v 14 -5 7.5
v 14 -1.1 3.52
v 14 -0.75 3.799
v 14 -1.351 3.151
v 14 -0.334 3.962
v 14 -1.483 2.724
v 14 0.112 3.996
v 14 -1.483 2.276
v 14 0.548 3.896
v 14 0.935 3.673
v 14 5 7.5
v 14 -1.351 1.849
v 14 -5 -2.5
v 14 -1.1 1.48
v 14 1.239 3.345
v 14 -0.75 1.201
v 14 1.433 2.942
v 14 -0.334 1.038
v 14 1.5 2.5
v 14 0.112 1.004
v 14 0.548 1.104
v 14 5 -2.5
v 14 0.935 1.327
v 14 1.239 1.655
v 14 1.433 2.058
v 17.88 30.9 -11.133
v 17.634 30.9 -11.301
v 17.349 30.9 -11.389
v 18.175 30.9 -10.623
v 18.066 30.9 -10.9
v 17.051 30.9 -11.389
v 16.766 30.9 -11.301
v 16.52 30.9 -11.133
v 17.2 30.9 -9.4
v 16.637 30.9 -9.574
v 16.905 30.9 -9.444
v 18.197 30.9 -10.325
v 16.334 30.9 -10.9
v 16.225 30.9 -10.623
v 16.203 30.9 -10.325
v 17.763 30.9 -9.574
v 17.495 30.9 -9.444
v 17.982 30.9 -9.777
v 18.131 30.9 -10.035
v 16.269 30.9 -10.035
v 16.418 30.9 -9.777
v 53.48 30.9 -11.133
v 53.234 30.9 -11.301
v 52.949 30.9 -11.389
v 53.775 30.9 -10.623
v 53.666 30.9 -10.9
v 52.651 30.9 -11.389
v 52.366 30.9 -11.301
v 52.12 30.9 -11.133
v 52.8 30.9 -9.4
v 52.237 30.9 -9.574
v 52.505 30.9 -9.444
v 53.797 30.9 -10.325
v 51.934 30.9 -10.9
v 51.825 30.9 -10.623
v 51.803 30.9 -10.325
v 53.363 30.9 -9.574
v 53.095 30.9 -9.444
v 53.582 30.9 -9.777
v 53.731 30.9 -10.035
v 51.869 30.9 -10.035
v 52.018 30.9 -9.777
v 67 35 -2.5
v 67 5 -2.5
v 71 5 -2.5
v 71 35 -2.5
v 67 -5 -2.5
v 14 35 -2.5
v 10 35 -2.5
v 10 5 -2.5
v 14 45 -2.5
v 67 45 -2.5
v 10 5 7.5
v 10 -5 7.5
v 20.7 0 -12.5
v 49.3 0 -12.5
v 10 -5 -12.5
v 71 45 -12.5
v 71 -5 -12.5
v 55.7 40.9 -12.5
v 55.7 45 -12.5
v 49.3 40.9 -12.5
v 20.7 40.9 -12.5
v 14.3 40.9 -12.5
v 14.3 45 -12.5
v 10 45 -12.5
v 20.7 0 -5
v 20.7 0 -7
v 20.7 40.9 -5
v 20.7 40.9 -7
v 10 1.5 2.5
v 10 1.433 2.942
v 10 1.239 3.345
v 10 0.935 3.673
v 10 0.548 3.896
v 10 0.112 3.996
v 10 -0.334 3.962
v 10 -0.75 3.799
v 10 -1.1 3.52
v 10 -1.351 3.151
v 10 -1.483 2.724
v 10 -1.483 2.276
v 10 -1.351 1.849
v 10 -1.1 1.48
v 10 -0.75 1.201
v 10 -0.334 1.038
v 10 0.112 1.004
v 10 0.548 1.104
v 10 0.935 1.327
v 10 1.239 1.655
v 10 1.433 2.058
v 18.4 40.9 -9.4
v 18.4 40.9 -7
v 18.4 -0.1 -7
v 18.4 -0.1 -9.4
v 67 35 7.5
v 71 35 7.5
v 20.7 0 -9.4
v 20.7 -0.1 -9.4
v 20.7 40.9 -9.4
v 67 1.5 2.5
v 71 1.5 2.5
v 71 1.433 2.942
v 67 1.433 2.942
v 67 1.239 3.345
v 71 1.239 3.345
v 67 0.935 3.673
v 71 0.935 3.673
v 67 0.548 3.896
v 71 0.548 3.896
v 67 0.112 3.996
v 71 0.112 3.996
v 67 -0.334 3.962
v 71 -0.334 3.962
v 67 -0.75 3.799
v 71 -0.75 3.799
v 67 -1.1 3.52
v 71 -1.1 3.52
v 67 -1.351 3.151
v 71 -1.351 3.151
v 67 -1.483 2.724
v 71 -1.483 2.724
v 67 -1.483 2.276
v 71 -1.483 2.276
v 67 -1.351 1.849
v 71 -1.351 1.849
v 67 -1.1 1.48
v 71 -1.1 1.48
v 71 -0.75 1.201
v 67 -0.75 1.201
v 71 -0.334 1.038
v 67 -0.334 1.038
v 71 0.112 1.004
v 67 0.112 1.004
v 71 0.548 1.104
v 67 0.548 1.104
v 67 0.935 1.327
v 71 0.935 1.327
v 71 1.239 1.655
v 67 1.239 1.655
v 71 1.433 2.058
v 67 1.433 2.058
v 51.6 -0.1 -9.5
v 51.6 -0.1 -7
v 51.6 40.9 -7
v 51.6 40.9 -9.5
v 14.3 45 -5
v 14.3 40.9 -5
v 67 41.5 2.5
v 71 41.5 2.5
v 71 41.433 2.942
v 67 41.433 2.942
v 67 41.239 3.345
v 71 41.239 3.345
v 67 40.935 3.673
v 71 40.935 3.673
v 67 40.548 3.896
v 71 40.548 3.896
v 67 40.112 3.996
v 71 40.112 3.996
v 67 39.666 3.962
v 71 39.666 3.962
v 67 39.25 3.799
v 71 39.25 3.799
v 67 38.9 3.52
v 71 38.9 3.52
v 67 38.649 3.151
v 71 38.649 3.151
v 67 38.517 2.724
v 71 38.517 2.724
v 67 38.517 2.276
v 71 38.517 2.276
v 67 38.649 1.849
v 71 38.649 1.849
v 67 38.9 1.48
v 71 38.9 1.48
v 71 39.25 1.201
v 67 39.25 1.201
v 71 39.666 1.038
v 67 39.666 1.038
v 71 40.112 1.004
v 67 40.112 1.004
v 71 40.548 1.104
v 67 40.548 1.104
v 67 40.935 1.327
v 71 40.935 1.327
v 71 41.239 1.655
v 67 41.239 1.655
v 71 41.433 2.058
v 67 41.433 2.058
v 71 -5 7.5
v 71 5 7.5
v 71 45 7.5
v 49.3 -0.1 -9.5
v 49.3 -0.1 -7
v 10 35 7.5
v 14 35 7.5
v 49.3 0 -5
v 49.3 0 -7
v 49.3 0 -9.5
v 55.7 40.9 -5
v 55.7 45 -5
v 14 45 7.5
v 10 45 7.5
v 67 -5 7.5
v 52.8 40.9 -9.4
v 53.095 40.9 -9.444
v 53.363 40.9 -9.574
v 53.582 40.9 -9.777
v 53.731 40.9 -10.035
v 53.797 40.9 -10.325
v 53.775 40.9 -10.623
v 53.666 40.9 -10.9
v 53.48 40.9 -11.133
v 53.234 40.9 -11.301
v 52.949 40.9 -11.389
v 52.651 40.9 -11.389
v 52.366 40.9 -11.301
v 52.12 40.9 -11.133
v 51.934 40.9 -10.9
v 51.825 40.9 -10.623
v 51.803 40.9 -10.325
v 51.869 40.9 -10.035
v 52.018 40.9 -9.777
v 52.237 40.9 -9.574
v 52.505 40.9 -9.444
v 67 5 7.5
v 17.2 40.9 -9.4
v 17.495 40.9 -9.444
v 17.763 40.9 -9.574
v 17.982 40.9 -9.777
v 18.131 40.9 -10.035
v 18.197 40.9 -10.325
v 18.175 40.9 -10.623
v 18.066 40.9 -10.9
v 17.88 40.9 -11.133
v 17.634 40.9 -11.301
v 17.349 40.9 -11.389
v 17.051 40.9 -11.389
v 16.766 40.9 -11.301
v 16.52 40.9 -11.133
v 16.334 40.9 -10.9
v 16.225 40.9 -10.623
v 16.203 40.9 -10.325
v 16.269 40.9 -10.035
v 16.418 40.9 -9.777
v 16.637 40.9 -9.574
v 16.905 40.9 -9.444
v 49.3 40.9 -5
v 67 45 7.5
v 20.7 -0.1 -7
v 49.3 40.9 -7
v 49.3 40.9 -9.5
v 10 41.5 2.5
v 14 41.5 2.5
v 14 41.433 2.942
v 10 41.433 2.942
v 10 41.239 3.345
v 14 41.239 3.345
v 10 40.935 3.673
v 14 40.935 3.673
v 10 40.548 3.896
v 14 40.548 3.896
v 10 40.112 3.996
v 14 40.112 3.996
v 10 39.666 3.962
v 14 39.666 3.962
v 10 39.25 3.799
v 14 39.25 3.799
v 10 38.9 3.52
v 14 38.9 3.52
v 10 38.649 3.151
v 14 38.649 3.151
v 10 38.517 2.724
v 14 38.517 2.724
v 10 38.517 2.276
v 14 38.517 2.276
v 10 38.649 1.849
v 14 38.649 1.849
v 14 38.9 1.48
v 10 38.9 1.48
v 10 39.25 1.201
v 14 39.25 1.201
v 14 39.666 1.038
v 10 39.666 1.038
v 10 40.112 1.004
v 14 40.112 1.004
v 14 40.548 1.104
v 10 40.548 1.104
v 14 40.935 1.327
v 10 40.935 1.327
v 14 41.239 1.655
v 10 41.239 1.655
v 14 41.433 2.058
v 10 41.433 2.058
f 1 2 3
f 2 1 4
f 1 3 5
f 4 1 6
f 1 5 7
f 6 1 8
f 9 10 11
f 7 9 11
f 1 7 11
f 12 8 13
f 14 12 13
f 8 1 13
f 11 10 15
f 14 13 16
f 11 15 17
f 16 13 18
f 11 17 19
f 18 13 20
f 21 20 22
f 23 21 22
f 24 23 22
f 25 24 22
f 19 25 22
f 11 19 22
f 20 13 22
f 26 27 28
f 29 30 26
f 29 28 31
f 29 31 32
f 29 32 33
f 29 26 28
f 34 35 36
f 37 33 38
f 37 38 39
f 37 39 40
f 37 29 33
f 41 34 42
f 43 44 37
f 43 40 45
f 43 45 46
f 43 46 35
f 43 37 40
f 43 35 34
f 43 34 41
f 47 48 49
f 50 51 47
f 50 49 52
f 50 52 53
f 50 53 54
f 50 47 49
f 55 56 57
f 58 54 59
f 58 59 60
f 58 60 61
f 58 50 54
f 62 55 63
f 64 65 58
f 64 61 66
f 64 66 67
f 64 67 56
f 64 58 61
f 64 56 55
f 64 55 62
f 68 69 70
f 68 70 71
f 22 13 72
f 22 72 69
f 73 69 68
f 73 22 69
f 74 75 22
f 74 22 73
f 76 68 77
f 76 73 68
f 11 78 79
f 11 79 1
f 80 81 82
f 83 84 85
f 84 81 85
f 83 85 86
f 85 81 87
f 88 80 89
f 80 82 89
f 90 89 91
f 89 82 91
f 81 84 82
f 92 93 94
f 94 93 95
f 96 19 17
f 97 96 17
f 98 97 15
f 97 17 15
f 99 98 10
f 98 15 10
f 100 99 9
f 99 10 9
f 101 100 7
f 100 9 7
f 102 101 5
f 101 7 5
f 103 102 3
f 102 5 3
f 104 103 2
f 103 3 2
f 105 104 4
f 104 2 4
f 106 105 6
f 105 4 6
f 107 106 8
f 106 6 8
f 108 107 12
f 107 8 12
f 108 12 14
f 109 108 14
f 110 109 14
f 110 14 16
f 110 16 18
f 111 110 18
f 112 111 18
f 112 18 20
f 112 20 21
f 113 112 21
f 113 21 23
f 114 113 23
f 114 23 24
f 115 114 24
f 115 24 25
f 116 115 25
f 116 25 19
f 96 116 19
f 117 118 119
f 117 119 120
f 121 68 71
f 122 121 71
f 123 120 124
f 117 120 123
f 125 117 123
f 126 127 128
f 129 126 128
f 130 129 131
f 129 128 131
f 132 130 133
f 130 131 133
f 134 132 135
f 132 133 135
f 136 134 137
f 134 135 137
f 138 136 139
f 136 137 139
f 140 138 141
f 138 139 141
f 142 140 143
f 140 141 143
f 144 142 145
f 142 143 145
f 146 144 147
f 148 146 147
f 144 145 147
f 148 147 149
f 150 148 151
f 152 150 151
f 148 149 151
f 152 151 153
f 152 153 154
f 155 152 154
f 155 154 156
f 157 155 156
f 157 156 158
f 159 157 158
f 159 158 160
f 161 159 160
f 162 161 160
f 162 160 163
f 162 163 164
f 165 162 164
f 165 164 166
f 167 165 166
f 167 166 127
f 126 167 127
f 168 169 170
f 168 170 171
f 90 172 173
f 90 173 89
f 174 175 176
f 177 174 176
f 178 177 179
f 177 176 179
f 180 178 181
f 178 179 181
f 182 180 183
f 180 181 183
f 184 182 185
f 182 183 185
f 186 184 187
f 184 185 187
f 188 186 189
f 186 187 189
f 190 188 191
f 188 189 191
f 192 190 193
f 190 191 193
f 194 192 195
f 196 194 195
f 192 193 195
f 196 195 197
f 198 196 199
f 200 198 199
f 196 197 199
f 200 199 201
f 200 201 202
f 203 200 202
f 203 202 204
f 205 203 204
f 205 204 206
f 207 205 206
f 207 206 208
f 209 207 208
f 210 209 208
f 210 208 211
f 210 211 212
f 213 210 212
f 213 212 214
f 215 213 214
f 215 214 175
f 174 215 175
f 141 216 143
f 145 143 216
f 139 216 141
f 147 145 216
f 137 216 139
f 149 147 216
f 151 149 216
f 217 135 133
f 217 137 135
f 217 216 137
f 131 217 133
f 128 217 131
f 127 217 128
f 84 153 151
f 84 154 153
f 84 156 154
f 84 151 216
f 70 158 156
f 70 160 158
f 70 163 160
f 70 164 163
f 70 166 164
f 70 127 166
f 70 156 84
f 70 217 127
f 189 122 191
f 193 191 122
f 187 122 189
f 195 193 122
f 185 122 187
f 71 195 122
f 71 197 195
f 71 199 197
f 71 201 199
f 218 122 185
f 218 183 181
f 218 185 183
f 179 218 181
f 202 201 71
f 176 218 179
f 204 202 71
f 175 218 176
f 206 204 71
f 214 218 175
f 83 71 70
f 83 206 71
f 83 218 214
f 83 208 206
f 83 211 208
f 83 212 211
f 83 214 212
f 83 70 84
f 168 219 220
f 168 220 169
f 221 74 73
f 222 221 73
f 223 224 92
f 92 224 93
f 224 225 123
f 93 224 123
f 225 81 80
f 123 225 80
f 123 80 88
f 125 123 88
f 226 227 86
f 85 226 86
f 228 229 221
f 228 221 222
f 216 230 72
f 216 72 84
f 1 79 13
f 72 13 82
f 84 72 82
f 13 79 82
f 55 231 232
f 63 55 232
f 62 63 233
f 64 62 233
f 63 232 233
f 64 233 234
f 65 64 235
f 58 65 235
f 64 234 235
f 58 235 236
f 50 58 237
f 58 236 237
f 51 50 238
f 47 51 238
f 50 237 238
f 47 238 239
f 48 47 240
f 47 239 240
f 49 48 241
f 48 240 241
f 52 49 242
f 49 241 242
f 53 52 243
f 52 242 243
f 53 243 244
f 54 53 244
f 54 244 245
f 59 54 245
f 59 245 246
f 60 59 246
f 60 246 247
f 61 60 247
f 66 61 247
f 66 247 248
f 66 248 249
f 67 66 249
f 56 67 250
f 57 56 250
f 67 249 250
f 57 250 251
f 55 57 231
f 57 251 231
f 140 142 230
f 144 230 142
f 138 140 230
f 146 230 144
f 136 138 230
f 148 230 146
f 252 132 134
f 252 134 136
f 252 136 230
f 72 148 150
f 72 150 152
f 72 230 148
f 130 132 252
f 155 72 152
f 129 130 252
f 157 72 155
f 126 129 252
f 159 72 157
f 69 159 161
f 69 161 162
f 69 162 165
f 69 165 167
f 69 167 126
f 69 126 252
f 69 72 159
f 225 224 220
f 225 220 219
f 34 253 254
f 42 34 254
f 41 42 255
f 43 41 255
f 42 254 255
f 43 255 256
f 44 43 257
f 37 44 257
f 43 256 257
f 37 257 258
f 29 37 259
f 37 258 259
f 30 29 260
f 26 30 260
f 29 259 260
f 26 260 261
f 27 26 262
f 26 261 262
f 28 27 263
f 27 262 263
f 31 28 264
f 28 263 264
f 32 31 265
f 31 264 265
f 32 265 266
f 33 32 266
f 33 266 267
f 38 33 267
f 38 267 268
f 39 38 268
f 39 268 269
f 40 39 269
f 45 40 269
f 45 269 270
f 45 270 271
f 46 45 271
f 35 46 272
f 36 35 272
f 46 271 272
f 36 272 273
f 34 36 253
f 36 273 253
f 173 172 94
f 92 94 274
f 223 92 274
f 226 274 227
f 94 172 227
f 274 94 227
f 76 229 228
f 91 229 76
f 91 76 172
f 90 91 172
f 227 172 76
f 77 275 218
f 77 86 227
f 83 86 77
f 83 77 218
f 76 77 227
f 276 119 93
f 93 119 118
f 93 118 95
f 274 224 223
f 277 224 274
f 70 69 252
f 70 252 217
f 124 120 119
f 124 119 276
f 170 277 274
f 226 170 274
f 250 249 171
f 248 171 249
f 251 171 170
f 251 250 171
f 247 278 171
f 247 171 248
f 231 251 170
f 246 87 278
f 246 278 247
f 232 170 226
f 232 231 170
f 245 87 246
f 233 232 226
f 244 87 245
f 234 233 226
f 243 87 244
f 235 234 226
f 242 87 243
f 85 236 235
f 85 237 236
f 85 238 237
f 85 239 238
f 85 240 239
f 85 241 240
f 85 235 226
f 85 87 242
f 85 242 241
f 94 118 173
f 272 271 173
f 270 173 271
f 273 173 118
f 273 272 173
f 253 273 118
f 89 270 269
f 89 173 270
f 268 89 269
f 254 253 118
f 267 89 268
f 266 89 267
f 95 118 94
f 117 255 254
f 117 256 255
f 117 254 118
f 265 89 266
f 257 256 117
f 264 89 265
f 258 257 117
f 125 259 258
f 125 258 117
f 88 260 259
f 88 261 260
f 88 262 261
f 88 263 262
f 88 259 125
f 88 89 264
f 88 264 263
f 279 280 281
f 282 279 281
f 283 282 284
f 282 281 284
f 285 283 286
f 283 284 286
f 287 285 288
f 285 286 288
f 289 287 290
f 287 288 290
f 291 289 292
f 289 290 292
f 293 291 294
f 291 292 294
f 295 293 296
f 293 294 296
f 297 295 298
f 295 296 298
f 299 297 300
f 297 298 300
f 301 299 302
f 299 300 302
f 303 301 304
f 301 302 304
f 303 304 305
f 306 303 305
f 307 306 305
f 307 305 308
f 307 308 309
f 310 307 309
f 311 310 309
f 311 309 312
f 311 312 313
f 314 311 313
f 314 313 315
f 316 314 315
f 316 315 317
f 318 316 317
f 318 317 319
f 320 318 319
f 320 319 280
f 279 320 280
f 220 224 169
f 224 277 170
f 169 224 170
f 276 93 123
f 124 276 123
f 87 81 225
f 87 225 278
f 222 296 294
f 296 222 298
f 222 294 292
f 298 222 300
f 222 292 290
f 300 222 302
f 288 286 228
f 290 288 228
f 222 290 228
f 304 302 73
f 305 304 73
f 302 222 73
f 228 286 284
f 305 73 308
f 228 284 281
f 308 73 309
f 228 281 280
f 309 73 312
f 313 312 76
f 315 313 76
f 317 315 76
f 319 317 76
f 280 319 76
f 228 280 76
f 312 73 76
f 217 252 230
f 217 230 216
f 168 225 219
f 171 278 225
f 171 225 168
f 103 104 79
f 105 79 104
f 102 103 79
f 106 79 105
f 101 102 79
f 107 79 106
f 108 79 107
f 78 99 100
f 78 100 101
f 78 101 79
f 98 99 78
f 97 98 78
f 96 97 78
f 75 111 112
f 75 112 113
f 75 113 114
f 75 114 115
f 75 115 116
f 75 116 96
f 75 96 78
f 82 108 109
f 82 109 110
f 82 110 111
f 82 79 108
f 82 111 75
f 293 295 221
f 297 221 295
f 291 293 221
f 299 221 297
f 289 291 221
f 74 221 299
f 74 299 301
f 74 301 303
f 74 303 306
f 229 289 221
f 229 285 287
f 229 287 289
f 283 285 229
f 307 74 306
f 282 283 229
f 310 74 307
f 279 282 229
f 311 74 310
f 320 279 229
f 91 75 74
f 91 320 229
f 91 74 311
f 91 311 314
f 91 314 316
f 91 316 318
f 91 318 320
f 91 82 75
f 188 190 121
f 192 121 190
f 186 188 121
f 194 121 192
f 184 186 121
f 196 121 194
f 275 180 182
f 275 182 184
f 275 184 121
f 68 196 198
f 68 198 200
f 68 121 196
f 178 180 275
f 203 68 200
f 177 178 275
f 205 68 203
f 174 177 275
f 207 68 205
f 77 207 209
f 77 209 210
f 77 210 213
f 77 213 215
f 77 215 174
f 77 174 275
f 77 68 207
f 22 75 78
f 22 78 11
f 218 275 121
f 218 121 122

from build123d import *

# Parameters (mm, degrees)
SKETCH1_W                = 10
SKETCH1_H                = 20
BOSS_EXTRUDE2_DEPTH      = 10
SKETCH3_W                = 10
SKETCH3_H                = 20
BOSS_EXTRUDE3_DEPTH      = 10
SKETCH4_W                = 62.5
SKETCH4_H                = 5
BOSS_EXTRUDE4_DEPTH      = 10
SKETCH6_R                = 1
CUT_EXTRUDE1_DEPTH       = 10
CUT_EXTRUDE3_START       = -10
SKETCH10_R               = 1
CUT_EXTRUDE3_DEPTH       = 10
SKETCH11_W               = 50
SKETCH11_H               = 50
BOSS_EXTRUDE8_DEPTH      = 10
SKETCH18_W               = 10
SKETCH18_H               = 10
BOSS_EXTRUDE9_DEPTH      = 6
SKETCH20_W               = 10
SKETCH20_H               = 10
BOSS_EXTRUDE10_DEPTH     = 12
SKETCH23_W               = 28.6
SKETCH23_H               = 45
CUT_EXTRUDE10_DEPTH      = 7.5
SKETCH24_W               = 6.4
SKETCH24_H               = 7.5
CUT_EXTRUDE11_DEPTH      = 4.1
SKETCH25_W               = 2.3
SKETCH25_H               = 2.5
CUT_EXTRUDE12_DEPTH      = 41
SKETCH26_W               = 2.3
SKETCH26_H               = 2.4
CUT_EXTRUDE13_DEPTH      = 41
SKETCH27_R               = 1
CUT_EXTRUDE14_DEPTH      = 10
SKETCH28_R               = 1
CUT_EXTRUDE15_DEPTH      = 10
SKETCH31_W               = 12.5
SKETCH31_H               = 10
BOSS_EXTRUDE11_DEPTH     = 5
SKETCH32_W               = 10
SKETCH32_H               = 10
CUT_EXTRUDE16_DEPTH      = 7.5
CUT_EXTRUDE17_DEPTH      = 7.5
SKETCH33_W               = 10
SKETCH33_H               = 10
BOSS_EXTRUDE12_DEPTH     = 5
SKETCH34_W               = 10
SKETCH34_H               = 10
BOSS_EXTRUDE13_DEPTH     = 5
SKETCH35_W               = 10
SKETCH35_H               = 10
BOSS_EXTRUDE14_DEPTH     = 3.5
SKETCH36_W               = 10
SKETCH36_H               = 10
BOSS_EXTRUDE15_DEPTH     = 9.5
CUT_EXTRUDE18_DEPTH      = 90.5
CUT_EXTRUDE18_DEPTH_BACK = 15.5
SKETCH37_R               = 1.25
CUT_EXTRUDE19_DEPTH      = 88.5
CUT_EXTRUDE19_DEPTH_BACK = 15.5
SKETCH38_R               = 1.25
SKETCH39_W               = 29.967126749
SKETCH39_H               = 31.835751001
SKETCH39_W_2             = 15.617210398
SKETCH39_H_2             = 32.298255859
CUT_EXTRUDE20_DEPTH      = 36
SKETCH40_W               = 10
SKETCH40_H               = 50
BOSS_EXTRUDE16_DEPTH     = 11
SKETCH41_W               = 4
SKETCH41_H               = 10
BOSS_EXTRUDE17_DEPTH     = 10
SKETCH42_R               = 1.5
CUT_EXTRUDE21_DEPTH      = 80


with BuildPart() as part:
    # Sketch1 → Boss-Extrude2 (new body)
    with BuildSketch(Plane(origin=(0, 0, 0), x_dir=(1, 0, 0), z_dir=(0, 1, 0))):
        with Locations((5, 10)):
            Rectangle(SKETCH1_W, SKETCH1_H)
    extrude(amount=BOSS_EXTRUDE2_DEPTH)



with BuildPart() as body_2:
    # Sketch3 → Boss-Extrude3 (new body)
    with BuildSketch(Plane(origin=(0, 0, 0), x_dir=(1, 0, 0), z_dir=(0, 1, 0))):
        with Locations((77.5, 10)):
            Rectangle(SKETCH3_W, SKETCH3_H)
    extrude(amount=BOSS_EXTRUDE3_DEPTH)


with BuildPart() as part_1:
    add(part.part)

    add(body_2.part)  # Boss-Extrude4 merges body 2
    # Sketch4 → Boss-Extrude4 (add)
    with BuildSketch(Plane(origin=(0, 0, 0), x_dir=(1, 0, 0), z_dir=(0, 1, 0))):
        with Locations((41.25, 10)):
            Rectangle(SKETCH4_W, SKETCH4_H)
    extrude(amount=BOSS_EXTRUDE4_DEPTH)

    # Sketch6 → Cut-Extrude1 (cut)
    with BuildSketch(Plane(origin=(10, 0, 0), x_dir=(0, 0, -1), z_dir=(1, 0, 0))):
        with Locations((16.25, 5)):
            Circle(SKETCH6_R)
    extrude(amount=-CUT_EXTRUDE1_DEPTH, mode=Mode.SUBTRACT)

    # Sketch10 → Cut-Extrude3 (cut)
    with BuildSketch(Plane.ZY.offset(-72.5).offset(CUT_EXTRUDE3_START)):
        with Locations(Location((-16.25, 5, 0), (0, 0, 180))):
            Circle(SKETCH10_R)
    extrude(amount=CUT_EXTRUDE3_DEPTH, mode=Mode.SUBTRACT)

    # Sketch11 → Boss-Extrude8 (add)
    with BuildSketch(Plane(origin=(0, 0, -12.5), x_dir=(-1, 0, 0), z_dir=(0, 0, -1))):
        with Locations((-35, 20)):
            Rectangle(SKETCH11_W, SKETCH11_H)
    extrude(amount=-BOSS_EXTRUDE8_DEPTH)

    # Sketch18 → Boss-Extrude9 (add)
    with BuildSketch(Plane.XY):
        with Locations((5, 5)):
            Rectangle(SKETCH18_W, SKETCH18_H)
    extrude(amount=BOSS_EXTRUDE9_DEPTH)

    # Sketch20 → Boss-Extrude10 (add)
    with BuildSketch(Plane.XZ):
        with Locations((77.5, -7.5)):
            Rectangle(SKETCH20_W, SKETCH20_H)
        with Locations((5, -7.5)):
            Rectangle(SKETCH20_W, SKETCH20_H)
    extrude(amount=BOSS_EXTRUDE10_DEPTH)

    # Sketch23 → Cut-Extrude10 (cut)
    with BuildSketch(Plane(origin=(0, 0, -12.5), x_dir=(-1, 0, 0), z_dir=(0, 0, -1))):
        with Locations((-35, 22.5)):
            Rectangle(SKETCH23_W, SKETCH23_H)
    extrude(amount=-CUT_EXTRUDE10_DEPTH, mode=Mode.SUBTRACT)

    # Sketch24 → Cut-Extrude11 (cut)
    with BuildSketch(Plane(origin=(0, 45, 0), x_dir=(1, 0, 0), z_dir=(0, 1, 0))):
        with Locations((17.5, 8.75)):
            Rectangle(SKETCH24_W, SKETCH24_H)
        with Locations((52.5, 8.75)):
            Rectangle(SKETCH24_W, SKETCH24_H)
    extrude(amount=-CUT_EXTRUDE11_DEPTH, mode=Mode.SUBTRACT)

    # Sketch25 → Cut-Extrude12 (cut)
    with BuildSketch(Plane(origin=(0, 40.9, 0), x_dir=(1, 0, 0), z_dir=(0, 1, 0))):
        with Locations((50.45, 8.25)):
            Rectangle(SKETCH25_W, SKETCH25_H)
    extrude(amount=-CUT_EXTRUDE12_DEPTH, mode=Mode.SUBTRACT)

    # Sketch26 → Cut-Extrude13 (cut)
    with BuildSketch(Plane(origin=(0, 40.9, 0), x_dir=(1, 0, 0), z_dir=(0, 1, 0))):
        with Locations((19.55, 8.2)):
            Rectangle(SKETCH26_W, SKETCH26_H)
    extrude(amount=-CUT_EXTRUDE13_DEPTH, mode=Mode.SUBTRACT)

    # Sketch27 → Cut-Extrude14 (cut)
    with BuildSketch(Plane(origin=(0, 40.9, 0), x_dir=(1, 0, 0), z_dir=(0, 1, 0))):
        with Locations(Location((17.2, 10.4, 0), (0, 0, 270))):
            Circle(SKETCH27_R)
    extrude(amount=-CUT_EXTRUDE14_DEPTH, mode=Mode.SUBTRACT)

    # Sketch28 → Cut-Extrude15 (cut)
    with BuildSketch(Plane(origin=(0, 40.9, 0), x_dir=(1, 0, 0), z_dir=(0, 1, 0))):
        with Locations(Location((52.8, 10.4, 0), (0, 0, 270))):
            Circle(SKETCH28_R)
    extrude(amount=-CUT_EXTRUDE15_DEPTH, mode=Mode.SUBTRACT)

    # Sketch31 → Boss-Extrude11 (add)
    with BuildSketch(Plane.XY.offset(-7.5)):
        with Locations((66.25, 5)):
            Rectangle(SKETCH31_W, SKETCH31_H)
    extrude(amount=BOSS_EXTRUDE11_DEPTH)

    # Sketch32 → Cut-Extrude16 (cut)
    with BuildSketch(Plane(origin=(0, 0, -20), x_dir=(-1, 0, 0), z_dir=(0, 0, -1))):
        with Locations((-77.5, 5)):
            Rectangle(SKETCH32_W, SKETCH32_H)
    extrude(amount=-CUT_EXTRUDE16_DEPTH, mode=Mode.SUBTRACT)

    # 3DSketch1 → Cut-Extrude17 (cut)
    with BuildSketch(Plane(origin=(10, 0, -20), x_dir=(-0.7071067811865476, 0.7071067811865476, 0), z_dir=(0, 0, 1))):
        Polygon((0, 0), (7.071067812, 7.071067812), (14.142135624, 0), (7.071067812, -7.071067812), align=None)
    extrude(amount=CUT_EXTRUDE17_DEPTH, mode=Mode.SUBTRACT)

    # Sketch33 → Boss-Extrude12 (add)
    with BuildSketch(Plane.XZ.offset(12)):
        with Locations((5, -7.5)):
            Rectangle(SKETCH33_W, SKETCH33_H)
    extrude(amount=BOSS_EXTRUDE12_DEPTH)

    # Sketch34 → Boss-Extrude13 (add)
    with BuildSketch(Plane.XZ.offset(12)):
        with Locations((77.5, -7.5)):
            Rectangle(SKETCH34_W, SKETCH34_H)
    extrude(amount=BOSS_EXTRUDE13_DEPTH)

    # Sketch35 → Boss-Extrude14 (add)
    with BuildSketch(Plane.XY.offset(6)):
        with Locations((5, 5)):
            Rectangle(SKETCH35_W, SKETCH35_H)
    extrude(amount=BOSS_EXTRUDE14_DEPTH)

    # Sketch36 → Boss-Extrude15 (add)
    with BuildSketch(Plane.XY):
        with Locations((77.5, 5)):
            Rectangle(SKETCH36_W, SKETCH36_H)
    extrude(amount=BOSS_EXTRUDE15_DEPTH)

    # Sketch37 → Cut-Extrude18 (cut, two sides: drawn at the far end of the back side and taken through both)
    with BuildSketch(Plane(origin=(10, 0, 0), x_dir=(0, 0, -1), z_dir=(1, 0, 0)).offset(-CUT_EXTRUDE18_DEPTH_BACK)):
        with Locations(Location((-3.5, 5, 0), (0, 0, 180))):
            Circle(SKETCH37_R)
    extrude(amount=CUT_EXTRUDE18_DEPTH + CUT_EXTRUDE18_DEPTH_BACK, mode=Mode.SUBTRACT)

    # Sketch38 → Cut-Extrude19 (cut, two sides: drawn at the far end of the back side and taken through both)
    with BuildSketch(Plane(origin=(10, 0, 0), x_dir=(0, 0, -1), z_dir=(1, 0, 0)).offset(-CUT_EXTRUDE19_DEPTH_BACK)):
        with Locations(Location((7.5, -11, 0), (0, 0, 180))):
            Circle(SKETCH38_R)
    extrude(amount=CUT_EXTRUDE19_DEPTH + CUT_EXTRUDE19_DEPTH_BACK, mode=Mode.SUBTRACT)

    # Sketch39 → Cut-Extrude20 (cut)
    with BuildSketch(Plane(origin=(0, 0, -12.5), x_dir=(-1, 0, 0), z_dir=(0, 0, -1))):
        with Locations((-74.983563375, -4.30748393)):
            Rectangle(SKETCH39_W, SKETCH39_H)
        with Locations((-2.191394801, -3.536642501)):
            Rectangle(SKETCH39_W_2, SKETCH39_H_2)
    extrude(amount=-CUT_EXTRUDE20_DEPTH, mode=Mode.SUBTRACT)

    # Sketch40 → Boss-Extrude16 (add)
    with BuildSketch(Plane(origin=(60, 0, 0), x_dir=(0, 0, -1), z_dir=(1, 0, 0))):
        with Locations((7.5, 20)):
            Rectangle(SKETCH40_W, SKETCH40_H)
    extrude(amount=BOSS_EXTRUDE16_DEPTH)

    # Sketch41 → Boss-Extrude17 (add)
    with BuildSketch(Plane.XY.offset(-2.5)):
        with Locations((12, 40)):
            Rectangle(SKETCH41_W, SKETCH41_H)
        with Locations((12, 0)):
            Rectangle(SKETCH41_W, SKETCH41_H)
        with Locations((69, 40)):
            Rectangle(SKETCH41_W, SKETCH41_H)
        with Locations((69, 0)):
            Rectangle(SKETCH41_W, SKETCH41_H)
    extrude(amount=BOSS_EXTRUDE17_DEPTH)

    # Sketch42 → Cut-Extrude21 (cut)
    with BuildSketch(Plane(origin=(71, 0, 0), x_dir=(0, 0, -1), z_dir=(1, 0, 0))):
        with Locations(Location((-2.5, 0, 0), (0, 0, 90))):
            Circle(SKETCH42_R)
        with Locations(Location((-2.5, 40, 0), (0, 0, 90))):
            Circle(SKETCH42_R)
    extrude(amount=-CUT_EXTRUDE21_DEPTH, mode=Mode.SUBTRACT)


solid = part_1.part
